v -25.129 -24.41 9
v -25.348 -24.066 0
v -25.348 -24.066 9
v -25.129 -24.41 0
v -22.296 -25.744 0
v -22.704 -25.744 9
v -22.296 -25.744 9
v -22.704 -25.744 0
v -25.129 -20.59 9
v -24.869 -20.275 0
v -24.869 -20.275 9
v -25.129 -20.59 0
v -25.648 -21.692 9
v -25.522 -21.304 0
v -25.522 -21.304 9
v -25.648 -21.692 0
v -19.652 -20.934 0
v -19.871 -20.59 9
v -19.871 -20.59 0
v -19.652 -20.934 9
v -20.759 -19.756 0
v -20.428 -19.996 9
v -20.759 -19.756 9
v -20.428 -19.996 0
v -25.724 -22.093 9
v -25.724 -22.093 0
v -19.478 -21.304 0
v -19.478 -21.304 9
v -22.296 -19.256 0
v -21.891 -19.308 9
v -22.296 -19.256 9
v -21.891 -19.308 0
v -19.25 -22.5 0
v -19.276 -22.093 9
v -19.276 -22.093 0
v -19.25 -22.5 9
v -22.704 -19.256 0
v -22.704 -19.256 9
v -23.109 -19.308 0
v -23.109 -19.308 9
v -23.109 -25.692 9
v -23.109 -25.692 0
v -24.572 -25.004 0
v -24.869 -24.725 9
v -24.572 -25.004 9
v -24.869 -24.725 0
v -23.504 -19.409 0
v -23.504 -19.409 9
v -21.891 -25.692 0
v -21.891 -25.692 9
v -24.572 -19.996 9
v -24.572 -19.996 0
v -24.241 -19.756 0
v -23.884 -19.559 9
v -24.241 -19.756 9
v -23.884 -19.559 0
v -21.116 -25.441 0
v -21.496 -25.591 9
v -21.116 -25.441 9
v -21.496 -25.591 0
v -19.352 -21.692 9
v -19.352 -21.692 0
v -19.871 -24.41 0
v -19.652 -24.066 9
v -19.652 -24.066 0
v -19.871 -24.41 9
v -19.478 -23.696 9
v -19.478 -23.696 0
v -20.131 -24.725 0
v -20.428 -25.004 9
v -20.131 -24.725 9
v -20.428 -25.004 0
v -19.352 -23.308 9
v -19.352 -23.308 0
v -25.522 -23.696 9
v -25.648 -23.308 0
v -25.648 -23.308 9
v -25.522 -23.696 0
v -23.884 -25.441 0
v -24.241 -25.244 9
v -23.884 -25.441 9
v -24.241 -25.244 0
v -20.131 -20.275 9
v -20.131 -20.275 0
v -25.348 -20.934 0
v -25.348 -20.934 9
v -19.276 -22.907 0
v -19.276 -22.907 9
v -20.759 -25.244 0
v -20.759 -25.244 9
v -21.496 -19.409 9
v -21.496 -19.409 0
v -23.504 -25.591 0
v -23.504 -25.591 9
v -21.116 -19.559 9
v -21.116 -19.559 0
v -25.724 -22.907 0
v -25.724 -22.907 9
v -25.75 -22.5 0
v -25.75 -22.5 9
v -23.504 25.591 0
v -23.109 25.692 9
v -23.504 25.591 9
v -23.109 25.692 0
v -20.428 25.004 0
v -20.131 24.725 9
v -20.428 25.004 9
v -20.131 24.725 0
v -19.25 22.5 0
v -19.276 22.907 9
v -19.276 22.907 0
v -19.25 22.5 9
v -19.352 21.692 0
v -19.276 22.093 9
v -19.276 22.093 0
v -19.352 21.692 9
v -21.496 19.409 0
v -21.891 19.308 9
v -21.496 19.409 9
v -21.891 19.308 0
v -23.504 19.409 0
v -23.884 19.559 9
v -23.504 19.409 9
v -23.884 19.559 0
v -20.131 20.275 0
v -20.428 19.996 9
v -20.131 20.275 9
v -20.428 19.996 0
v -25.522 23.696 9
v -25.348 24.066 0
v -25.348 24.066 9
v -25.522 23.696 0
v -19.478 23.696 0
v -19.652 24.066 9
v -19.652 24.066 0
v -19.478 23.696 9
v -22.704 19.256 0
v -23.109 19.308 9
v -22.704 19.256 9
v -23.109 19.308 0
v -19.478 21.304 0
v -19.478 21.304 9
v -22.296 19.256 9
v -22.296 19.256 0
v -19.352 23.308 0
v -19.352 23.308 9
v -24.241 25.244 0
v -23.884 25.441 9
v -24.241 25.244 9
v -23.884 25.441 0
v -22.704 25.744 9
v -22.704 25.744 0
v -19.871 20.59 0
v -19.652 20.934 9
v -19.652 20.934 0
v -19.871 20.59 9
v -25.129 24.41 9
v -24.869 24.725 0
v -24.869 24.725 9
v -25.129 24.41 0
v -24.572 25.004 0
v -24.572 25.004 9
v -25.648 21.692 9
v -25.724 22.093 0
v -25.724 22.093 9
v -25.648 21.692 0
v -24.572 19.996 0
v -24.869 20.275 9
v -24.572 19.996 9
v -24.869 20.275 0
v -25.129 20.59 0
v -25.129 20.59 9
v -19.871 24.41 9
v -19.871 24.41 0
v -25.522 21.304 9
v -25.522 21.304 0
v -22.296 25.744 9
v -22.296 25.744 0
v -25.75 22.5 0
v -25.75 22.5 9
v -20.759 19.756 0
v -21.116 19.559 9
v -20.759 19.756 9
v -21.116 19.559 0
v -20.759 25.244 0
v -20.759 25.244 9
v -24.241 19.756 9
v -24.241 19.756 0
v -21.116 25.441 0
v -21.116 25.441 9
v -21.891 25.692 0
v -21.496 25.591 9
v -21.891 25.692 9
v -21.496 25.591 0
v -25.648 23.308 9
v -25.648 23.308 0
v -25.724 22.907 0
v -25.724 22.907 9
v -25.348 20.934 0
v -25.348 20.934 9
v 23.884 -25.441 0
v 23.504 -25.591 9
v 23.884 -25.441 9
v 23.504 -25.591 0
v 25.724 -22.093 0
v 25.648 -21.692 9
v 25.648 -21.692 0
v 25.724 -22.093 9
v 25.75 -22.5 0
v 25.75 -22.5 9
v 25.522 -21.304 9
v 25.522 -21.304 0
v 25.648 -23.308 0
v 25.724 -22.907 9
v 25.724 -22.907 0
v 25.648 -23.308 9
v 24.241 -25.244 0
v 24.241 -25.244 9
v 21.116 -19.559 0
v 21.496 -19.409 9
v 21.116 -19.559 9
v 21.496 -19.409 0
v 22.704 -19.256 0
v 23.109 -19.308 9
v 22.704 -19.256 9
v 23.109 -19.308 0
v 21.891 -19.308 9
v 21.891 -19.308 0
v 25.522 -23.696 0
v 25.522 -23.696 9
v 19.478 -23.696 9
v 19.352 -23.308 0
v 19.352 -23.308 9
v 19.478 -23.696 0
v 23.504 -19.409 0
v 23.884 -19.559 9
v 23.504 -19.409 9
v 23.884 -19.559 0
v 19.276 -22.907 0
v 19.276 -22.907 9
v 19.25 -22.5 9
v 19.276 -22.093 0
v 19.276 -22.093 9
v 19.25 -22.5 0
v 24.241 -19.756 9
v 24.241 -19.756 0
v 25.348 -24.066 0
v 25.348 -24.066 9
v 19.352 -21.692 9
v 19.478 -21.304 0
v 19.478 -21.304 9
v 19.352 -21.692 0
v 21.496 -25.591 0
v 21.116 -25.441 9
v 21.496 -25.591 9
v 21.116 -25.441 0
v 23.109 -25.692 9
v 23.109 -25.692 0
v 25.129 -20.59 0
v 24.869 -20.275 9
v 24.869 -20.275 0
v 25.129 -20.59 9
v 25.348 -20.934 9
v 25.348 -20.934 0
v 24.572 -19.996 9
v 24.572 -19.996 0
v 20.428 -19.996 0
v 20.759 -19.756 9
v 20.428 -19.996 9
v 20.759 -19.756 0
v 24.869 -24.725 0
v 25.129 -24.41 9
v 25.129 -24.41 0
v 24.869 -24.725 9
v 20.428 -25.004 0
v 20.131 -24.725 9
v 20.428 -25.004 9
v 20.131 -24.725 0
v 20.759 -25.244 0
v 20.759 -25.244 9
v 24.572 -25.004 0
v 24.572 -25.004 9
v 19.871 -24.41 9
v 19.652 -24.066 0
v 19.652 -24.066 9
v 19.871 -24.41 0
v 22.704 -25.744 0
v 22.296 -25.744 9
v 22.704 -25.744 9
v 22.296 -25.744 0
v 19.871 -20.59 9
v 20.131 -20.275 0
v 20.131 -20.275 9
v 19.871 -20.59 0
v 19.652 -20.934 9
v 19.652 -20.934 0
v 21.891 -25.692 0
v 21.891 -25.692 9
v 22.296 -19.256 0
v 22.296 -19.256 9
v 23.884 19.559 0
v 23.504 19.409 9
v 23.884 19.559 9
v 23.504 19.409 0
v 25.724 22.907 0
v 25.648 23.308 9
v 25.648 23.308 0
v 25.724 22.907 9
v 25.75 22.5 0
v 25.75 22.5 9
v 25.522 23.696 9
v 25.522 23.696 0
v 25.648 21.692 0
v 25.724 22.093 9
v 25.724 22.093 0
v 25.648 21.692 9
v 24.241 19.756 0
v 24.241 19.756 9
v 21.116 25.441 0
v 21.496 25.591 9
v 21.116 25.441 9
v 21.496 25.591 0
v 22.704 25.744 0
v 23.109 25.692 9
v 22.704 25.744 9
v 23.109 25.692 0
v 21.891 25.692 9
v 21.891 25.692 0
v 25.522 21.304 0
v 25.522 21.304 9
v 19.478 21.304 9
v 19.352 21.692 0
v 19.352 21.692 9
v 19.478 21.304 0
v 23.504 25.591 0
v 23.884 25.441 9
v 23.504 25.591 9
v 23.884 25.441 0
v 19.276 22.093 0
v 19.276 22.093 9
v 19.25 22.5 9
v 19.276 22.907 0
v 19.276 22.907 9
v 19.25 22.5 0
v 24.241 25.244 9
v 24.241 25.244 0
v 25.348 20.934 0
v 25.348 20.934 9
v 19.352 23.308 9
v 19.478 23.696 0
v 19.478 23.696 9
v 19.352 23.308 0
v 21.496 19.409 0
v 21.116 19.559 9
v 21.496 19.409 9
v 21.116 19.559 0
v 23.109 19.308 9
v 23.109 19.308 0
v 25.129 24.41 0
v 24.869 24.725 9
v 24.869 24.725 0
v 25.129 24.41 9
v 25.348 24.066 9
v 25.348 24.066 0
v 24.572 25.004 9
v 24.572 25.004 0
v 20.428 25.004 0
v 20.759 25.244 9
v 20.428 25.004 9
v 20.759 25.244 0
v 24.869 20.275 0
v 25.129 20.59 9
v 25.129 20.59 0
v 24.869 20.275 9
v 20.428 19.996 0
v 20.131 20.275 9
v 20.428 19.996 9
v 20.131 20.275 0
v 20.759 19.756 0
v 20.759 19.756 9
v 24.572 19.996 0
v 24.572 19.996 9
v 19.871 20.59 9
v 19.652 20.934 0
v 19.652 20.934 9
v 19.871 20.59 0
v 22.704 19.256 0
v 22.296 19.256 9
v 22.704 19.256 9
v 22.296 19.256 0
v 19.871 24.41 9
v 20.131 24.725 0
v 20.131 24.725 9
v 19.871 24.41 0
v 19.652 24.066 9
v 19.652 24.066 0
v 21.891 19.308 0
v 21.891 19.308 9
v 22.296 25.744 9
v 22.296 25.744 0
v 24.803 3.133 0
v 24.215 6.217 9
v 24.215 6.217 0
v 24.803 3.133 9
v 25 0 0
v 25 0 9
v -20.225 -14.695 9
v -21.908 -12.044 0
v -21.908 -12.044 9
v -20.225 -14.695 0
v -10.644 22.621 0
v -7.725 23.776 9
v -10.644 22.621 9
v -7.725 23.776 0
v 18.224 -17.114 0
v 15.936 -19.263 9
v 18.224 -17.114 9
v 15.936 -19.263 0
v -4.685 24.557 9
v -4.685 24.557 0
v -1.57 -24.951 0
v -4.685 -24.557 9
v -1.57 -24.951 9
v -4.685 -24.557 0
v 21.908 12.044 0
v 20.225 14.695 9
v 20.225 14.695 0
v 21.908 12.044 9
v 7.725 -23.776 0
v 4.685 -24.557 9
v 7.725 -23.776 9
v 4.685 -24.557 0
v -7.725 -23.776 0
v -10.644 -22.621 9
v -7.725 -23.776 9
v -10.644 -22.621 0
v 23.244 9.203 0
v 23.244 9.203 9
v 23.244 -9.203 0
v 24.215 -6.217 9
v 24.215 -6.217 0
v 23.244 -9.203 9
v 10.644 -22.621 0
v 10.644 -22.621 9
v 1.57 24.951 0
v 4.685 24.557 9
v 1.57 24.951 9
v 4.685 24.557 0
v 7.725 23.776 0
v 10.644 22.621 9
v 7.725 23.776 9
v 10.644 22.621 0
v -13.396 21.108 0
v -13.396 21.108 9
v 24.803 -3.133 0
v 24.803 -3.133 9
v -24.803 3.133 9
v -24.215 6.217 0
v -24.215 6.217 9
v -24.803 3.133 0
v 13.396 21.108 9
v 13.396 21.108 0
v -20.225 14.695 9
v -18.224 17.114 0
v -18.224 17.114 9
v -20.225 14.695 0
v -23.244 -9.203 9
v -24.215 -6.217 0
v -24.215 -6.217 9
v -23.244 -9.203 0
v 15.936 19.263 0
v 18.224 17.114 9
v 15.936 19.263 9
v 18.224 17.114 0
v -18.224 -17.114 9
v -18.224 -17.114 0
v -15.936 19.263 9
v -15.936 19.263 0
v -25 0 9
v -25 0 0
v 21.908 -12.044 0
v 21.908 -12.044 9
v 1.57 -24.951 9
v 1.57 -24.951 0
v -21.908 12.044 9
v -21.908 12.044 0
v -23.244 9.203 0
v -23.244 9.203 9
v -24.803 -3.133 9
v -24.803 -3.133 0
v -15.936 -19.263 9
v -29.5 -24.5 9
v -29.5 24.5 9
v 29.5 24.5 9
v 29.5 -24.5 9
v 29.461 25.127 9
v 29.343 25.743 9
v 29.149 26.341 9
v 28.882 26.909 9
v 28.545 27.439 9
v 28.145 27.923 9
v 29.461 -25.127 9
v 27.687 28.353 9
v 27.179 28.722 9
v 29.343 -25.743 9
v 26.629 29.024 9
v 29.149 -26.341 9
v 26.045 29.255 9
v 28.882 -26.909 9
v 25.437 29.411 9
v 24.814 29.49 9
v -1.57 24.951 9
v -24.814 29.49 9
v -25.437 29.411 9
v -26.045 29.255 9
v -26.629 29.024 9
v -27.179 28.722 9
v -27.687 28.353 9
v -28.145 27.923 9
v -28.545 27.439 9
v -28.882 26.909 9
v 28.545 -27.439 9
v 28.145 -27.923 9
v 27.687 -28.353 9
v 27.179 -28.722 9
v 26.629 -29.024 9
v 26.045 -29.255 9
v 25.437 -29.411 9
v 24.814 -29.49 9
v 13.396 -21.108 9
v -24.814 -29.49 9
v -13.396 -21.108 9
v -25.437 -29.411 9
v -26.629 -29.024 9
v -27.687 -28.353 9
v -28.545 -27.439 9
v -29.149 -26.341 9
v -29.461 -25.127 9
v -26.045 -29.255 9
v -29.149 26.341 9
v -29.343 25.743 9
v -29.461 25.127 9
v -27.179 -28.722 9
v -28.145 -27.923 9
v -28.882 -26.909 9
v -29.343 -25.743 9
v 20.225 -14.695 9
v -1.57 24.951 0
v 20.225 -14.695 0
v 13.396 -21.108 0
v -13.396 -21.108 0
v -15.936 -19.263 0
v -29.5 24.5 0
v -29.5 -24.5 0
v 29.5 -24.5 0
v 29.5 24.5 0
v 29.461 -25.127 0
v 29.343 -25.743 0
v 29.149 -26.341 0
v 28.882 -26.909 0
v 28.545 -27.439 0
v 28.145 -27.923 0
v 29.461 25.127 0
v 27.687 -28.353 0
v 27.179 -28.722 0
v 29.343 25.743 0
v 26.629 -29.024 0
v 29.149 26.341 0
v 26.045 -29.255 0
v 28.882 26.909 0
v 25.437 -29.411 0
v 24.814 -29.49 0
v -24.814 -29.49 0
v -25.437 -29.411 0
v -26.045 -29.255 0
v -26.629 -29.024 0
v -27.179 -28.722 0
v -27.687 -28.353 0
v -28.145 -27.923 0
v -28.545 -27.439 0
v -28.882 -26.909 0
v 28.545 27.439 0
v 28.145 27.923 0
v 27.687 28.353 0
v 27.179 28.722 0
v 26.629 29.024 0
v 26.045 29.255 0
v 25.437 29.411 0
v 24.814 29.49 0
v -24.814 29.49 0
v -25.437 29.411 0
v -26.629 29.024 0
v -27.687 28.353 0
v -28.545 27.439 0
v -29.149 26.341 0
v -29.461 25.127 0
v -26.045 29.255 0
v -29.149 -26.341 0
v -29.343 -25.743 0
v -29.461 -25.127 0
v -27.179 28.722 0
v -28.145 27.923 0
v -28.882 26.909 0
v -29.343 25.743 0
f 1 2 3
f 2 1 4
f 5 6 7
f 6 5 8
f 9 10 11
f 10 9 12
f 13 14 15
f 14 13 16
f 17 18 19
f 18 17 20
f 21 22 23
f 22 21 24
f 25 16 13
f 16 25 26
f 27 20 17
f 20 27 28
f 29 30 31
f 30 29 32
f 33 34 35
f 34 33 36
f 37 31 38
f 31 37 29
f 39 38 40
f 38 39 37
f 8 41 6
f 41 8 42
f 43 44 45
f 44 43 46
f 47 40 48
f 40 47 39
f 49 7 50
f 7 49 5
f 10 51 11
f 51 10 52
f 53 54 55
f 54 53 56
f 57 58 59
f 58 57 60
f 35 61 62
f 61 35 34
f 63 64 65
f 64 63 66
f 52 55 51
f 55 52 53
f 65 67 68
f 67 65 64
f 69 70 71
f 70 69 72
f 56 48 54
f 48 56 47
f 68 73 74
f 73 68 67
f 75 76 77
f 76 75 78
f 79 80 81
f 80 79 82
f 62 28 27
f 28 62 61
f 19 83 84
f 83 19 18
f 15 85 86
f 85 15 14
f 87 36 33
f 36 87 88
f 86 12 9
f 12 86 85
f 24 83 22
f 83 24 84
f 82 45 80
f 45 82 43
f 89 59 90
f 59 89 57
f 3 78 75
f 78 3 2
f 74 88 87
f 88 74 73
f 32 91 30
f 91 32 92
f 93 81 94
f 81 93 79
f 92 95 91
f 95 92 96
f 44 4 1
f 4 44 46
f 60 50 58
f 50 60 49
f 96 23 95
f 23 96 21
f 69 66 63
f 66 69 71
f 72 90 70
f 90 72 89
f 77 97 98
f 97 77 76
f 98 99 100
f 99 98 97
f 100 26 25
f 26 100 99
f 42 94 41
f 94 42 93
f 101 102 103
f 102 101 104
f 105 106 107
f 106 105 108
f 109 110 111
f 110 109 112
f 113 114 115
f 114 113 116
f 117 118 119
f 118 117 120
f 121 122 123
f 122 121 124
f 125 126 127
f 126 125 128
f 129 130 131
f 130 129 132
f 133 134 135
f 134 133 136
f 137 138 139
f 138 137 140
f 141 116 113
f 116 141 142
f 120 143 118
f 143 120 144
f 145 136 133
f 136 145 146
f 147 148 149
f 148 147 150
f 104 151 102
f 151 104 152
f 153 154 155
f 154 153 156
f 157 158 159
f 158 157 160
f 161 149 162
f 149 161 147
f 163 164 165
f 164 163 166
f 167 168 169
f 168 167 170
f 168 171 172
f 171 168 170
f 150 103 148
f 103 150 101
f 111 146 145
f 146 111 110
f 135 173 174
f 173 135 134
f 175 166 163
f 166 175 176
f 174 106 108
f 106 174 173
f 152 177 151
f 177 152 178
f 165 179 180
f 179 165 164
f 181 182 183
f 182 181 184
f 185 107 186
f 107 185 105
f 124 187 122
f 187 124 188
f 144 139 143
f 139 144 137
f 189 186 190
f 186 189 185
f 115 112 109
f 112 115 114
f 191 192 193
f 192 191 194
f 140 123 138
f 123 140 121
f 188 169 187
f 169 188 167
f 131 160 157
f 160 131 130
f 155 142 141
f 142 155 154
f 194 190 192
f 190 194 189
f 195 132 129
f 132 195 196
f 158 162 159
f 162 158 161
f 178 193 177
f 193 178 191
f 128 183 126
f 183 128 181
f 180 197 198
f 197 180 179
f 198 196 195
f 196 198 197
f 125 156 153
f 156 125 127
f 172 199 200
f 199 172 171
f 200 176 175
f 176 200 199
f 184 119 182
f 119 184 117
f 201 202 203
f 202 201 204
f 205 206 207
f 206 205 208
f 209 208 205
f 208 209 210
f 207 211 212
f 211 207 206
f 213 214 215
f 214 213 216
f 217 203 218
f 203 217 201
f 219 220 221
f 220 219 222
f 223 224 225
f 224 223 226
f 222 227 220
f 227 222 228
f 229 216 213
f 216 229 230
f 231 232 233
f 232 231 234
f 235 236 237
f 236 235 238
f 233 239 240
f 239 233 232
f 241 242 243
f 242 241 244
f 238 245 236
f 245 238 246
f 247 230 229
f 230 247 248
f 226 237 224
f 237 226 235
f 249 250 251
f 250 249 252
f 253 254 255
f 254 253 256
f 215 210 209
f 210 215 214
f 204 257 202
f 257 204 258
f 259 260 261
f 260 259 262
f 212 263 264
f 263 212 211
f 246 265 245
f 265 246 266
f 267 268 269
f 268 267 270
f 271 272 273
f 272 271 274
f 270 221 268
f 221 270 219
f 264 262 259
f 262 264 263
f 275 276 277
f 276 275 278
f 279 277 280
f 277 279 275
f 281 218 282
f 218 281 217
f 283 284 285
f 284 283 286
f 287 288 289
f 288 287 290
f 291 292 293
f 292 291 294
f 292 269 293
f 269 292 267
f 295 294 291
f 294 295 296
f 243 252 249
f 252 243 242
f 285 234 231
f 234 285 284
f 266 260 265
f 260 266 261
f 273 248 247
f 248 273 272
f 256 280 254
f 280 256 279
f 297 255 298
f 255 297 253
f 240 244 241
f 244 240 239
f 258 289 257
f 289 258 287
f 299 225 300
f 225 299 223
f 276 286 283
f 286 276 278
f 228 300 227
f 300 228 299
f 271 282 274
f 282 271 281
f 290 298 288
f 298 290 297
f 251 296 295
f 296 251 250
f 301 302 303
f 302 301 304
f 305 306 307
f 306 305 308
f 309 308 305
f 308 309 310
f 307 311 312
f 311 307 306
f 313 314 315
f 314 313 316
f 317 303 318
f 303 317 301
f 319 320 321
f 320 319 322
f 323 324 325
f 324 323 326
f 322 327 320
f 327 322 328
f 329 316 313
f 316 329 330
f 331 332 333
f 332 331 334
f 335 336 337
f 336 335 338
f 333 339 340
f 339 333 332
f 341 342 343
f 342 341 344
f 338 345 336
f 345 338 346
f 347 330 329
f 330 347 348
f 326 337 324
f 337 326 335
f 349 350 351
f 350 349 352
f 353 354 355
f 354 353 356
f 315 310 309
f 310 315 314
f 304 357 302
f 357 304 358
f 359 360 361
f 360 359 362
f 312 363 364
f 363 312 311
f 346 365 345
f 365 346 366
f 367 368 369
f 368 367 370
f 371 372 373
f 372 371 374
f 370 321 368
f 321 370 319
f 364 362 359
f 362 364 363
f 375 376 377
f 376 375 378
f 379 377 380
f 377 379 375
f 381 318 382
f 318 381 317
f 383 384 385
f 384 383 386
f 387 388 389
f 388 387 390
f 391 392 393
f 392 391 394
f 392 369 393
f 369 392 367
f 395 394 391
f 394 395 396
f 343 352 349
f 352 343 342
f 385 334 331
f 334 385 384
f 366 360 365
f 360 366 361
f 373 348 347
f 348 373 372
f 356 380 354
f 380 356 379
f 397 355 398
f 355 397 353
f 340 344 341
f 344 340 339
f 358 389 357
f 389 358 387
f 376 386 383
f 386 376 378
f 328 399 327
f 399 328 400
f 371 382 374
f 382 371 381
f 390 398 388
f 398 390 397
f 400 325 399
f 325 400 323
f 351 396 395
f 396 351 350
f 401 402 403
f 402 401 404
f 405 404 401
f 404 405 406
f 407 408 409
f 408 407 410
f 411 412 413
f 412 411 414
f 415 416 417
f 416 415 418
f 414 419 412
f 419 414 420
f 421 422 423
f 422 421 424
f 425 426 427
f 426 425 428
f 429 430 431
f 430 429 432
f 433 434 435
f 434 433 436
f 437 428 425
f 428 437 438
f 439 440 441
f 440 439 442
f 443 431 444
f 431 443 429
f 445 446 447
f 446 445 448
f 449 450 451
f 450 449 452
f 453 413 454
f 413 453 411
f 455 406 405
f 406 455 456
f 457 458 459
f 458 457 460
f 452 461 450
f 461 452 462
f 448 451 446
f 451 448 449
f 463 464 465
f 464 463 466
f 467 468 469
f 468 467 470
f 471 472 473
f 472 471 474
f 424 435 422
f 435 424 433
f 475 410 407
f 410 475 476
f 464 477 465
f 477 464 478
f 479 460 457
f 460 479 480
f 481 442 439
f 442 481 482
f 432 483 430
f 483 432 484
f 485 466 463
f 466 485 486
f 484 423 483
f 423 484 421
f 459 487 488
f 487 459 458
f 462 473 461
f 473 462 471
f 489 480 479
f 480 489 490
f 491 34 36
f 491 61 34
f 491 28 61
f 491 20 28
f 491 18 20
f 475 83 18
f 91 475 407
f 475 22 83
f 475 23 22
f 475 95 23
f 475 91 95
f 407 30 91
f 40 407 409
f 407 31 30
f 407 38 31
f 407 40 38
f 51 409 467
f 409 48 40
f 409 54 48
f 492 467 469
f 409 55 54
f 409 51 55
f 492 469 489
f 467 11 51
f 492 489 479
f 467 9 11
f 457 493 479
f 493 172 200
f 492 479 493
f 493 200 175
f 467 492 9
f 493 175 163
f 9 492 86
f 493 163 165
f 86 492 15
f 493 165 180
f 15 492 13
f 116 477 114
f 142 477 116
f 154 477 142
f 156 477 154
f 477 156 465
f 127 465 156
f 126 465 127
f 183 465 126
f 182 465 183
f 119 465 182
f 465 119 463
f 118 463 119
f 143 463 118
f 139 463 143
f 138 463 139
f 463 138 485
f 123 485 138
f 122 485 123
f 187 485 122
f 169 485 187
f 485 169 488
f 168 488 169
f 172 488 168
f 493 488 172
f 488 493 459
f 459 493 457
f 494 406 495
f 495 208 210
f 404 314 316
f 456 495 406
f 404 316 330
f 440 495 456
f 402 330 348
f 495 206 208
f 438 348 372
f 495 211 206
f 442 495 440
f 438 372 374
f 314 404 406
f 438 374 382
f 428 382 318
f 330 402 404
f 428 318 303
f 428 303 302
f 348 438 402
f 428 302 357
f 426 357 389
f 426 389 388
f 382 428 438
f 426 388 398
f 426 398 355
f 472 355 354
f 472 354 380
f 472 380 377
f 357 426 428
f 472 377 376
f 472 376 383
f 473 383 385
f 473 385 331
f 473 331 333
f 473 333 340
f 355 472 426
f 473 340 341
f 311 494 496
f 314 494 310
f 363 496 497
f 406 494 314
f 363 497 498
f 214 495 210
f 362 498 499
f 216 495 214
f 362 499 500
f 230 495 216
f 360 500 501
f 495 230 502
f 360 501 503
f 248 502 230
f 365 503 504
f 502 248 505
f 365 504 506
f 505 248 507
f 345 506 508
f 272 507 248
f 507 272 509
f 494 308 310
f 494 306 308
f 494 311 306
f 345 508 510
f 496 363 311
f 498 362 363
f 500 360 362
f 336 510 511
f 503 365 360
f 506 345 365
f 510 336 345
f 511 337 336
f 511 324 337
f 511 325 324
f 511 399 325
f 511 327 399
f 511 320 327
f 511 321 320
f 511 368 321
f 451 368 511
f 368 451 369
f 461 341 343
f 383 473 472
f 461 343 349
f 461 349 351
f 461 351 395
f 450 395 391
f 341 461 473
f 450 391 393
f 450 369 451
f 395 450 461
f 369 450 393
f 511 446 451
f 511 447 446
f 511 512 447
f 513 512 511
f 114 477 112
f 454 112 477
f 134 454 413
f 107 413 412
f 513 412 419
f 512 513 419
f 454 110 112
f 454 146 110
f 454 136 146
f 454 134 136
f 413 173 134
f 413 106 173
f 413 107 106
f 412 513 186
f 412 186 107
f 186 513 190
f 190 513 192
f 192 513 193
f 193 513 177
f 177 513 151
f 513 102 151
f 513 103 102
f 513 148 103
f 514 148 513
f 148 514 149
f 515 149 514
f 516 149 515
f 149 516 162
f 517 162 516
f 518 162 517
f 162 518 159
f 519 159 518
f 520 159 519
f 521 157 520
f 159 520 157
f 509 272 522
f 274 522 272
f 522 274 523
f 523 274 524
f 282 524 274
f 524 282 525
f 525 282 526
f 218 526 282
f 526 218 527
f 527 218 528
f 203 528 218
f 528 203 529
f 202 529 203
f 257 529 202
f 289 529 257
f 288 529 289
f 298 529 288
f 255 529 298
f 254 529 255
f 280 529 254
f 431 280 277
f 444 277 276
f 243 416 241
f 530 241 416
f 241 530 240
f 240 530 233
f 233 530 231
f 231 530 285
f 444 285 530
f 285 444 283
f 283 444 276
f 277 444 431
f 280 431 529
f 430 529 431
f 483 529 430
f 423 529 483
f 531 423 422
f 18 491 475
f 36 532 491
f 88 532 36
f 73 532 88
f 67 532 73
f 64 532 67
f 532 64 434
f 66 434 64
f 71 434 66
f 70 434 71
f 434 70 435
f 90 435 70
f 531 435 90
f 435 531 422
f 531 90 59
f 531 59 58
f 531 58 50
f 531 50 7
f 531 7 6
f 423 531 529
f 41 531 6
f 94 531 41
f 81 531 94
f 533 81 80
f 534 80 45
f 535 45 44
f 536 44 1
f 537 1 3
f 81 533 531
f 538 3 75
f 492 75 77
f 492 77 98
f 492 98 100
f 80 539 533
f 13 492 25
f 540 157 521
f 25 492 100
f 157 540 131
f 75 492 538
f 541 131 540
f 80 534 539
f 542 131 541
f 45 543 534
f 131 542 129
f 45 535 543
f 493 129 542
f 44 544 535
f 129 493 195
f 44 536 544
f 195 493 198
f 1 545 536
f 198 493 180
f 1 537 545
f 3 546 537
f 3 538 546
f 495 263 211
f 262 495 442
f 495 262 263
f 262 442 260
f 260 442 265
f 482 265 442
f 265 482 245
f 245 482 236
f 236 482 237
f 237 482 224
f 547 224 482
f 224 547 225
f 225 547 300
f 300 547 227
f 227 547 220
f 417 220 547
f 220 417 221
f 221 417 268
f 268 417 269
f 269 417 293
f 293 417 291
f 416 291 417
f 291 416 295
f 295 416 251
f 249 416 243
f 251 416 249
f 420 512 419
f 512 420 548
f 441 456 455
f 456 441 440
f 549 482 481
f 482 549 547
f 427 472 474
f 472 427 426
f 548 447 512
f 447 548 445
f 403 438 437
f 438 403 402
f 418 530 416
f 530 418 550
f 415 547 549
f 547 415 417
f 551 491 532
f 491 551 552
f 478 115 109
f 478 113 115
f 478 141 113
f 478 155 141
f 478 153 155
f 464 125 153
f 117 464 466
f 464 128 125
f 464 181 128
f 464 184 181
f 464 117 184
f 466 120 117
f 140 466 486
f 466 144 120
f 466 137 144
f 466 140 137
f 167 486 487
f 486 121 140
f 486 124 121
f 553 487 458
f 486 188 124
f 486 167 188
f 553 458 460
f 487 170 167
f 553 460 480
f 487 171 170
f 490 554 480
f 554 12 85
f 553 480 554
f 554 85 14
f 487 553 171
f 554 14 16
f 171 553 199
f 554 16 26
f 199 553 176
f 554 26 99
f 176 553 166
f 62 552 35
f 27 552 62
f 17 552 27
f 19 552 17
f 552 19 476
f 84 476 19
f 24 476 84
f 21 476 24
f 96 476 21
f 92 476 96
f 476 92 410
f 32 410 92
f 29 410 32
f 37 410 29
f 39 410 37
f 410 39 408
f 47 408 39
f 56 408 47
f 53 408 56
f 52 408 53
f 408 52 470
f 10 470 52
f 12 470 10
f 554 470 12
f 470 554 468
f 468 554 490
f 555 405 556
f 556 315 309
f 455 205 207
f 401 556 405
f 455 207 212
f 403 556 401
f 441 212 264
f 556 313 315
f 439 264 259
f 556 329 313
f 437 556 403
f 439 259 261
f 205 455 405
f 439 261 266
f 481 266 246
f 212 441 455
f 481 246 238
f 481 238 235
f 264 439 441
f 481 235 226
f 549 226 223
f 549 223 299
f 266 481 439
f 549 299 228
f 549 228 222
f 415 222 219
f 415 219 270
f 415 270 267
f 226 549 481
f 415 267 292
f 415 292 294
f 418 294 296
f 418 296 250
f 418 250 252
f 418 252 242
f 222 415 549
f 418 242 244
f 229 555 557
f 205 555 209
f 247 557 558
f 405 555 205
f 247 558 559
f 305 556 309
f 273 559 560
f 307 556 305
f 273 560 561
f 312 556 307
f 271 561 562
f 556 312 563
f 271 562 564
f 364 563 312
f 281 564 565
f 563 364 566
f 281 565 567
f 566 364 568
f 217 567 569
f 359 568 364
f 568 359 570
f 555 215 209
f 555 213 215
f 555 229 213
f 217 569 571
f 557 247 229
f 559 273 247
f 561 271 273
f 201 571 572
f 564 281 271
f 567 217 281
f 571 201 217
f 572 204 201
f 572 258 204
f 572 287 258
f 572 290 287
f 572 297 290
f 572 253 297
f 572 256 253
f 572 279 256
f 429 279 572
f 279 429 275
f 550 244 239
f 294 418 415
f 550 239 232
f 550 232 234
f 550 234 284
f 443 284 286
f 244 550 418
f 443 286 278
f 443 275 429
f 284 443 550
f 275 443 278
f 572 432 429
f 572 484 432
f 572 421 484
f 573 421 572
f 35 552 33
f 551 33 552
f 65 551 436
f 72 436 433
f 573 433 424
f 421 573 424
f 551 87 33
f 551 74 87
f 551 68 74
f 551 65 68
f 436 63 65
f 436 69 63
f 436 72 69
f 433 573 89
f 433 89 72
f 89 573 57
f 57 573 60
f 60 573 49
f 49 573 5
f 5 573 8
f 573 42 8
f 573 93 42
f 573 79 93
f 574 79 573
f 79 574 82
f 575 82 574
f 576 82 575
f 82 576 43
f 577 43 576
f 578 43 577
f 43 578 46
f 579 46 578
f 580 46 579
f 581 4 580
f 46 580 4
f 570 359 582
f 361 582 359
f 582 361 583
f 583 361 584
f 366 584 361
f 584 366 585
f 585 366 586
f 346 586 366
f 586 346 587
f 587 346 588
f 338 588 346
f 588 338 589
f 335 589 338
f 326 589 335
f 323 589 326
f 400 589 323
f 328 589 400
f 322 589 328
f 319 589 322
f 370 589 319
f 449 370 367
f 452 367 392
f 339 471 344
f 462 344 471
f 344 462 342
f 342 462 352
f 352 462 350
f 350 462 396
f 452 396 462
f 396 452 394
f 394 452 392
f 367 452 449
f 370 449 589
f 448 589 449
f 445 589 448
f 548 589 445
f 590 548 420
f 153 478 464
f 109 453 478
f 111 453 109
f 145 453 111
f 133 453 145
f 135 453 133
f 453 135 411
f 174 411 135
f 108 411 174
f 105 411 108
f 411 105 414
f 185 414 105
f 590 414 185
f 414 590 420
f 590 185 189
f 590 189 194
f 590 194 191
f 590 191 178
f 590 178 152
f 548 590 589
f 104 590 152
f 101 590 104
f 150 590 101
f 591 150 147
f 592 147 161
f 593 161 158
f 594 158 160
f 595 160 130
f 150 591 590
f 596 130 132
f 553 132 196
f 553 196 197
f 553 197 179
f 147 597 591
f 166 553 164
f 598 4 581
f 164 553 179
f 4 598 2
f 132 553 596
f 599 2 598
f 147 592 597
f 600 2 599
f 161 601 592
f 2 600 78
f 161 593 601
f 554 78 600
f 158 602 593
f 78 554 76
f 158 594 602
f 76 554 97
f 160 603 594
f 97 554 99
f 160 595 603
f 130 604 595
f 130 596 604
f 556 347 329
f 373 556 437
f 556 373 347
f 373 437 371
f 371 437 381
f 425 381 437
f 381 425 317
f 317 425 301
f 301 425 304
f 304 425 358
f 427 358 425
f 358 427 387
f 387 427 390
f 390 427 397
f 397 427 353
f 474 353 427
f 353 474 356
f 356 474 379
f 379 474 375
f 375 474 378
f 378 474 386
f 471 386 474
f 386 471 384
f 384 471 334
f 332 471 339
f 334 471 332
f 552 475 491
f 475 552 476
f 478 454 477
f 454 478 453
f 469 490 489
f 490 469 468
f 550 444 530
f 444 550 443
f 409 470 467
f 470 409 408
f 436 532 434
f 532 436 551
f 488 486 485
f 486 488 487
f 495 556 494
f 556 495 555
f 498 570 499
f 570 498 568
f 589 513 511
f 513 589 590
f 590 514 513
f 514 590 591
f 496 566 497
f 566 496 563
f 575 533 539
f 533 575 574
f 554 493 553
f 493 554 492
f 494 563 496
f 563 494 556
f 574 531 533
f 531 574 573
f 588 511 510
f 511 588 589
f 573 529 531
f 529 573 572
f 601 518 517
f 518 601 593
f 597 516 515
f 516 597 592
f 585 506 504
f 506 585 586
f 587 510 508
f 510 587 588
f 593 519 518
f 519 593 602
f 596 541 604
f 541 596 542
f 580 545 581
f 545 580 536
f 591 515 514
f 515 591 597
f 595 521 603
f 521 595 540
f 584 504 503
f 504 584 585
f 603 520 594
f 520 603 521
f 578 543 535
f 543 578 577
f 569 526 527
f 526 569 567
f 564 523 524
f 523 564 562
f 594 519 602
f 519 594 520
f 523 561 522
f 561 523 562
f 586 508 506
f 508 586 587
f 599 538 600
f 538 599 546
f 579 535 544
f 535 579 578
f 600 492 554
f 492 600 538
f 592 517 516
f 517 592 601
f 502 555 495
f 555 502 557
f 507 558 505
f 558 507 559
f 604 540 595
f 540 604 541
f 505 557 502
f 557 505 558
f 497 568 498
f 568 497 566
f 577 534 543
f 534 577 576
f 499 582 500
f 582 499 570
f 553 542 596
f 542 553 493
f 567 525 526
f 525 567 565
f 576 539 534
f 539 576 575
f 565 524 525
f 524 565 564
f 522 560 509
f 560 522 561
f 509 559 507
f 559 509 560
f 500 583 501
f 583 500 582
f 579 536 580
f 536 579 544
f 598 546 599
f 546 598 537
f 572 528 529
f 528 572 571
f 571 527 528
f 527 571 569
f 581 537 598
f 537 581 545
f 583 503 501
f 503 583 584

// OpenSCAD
$fn = 50;


difference() {
	union() {
		hull() {
			translate(v = [-24.5000000000, 24.5000000000, 0]) {
				cylinder(h = 9, r = 5);
			}
			translate(v = [24.5000000000, 24.5000000000, 0]) {
				cylinder(h = 9, r = 5);
			}
			translate(v = [-24.5000000000, -24.5000000000, 0]) {
				cylinder(h = 9, r = 5);
			}
			translate(v = [24.5000000000, -24.5000000000, 0]) {
				cylinder(h = 9, r = 5);
			}
		}
	}
	union() {
		#translate(v = [-22.5000000000, -22.5000000000, -100.0000000000]) {
			cylinder(h = 200, r = 3.2500000000);
		}
		#translate(v = [-22.5000000000, 22.5000000000, -100.0000000000]) {
			cylinder(h = 200, r = 3.2500000000);
		}
		#translate(v = [22.5000000000, -22.5000000000, -100.0000000000]) {
			cylinder(h = 200, r = 3.2500000000);
		}
		#translate(v = [22.5000000000, 22.5000000000, -100.0000000000]) {
			cylinder(h = 200, r = 3.2500000000);
		}
		#cylinder(h = 9, r = 25.0000000000);
	}
}
